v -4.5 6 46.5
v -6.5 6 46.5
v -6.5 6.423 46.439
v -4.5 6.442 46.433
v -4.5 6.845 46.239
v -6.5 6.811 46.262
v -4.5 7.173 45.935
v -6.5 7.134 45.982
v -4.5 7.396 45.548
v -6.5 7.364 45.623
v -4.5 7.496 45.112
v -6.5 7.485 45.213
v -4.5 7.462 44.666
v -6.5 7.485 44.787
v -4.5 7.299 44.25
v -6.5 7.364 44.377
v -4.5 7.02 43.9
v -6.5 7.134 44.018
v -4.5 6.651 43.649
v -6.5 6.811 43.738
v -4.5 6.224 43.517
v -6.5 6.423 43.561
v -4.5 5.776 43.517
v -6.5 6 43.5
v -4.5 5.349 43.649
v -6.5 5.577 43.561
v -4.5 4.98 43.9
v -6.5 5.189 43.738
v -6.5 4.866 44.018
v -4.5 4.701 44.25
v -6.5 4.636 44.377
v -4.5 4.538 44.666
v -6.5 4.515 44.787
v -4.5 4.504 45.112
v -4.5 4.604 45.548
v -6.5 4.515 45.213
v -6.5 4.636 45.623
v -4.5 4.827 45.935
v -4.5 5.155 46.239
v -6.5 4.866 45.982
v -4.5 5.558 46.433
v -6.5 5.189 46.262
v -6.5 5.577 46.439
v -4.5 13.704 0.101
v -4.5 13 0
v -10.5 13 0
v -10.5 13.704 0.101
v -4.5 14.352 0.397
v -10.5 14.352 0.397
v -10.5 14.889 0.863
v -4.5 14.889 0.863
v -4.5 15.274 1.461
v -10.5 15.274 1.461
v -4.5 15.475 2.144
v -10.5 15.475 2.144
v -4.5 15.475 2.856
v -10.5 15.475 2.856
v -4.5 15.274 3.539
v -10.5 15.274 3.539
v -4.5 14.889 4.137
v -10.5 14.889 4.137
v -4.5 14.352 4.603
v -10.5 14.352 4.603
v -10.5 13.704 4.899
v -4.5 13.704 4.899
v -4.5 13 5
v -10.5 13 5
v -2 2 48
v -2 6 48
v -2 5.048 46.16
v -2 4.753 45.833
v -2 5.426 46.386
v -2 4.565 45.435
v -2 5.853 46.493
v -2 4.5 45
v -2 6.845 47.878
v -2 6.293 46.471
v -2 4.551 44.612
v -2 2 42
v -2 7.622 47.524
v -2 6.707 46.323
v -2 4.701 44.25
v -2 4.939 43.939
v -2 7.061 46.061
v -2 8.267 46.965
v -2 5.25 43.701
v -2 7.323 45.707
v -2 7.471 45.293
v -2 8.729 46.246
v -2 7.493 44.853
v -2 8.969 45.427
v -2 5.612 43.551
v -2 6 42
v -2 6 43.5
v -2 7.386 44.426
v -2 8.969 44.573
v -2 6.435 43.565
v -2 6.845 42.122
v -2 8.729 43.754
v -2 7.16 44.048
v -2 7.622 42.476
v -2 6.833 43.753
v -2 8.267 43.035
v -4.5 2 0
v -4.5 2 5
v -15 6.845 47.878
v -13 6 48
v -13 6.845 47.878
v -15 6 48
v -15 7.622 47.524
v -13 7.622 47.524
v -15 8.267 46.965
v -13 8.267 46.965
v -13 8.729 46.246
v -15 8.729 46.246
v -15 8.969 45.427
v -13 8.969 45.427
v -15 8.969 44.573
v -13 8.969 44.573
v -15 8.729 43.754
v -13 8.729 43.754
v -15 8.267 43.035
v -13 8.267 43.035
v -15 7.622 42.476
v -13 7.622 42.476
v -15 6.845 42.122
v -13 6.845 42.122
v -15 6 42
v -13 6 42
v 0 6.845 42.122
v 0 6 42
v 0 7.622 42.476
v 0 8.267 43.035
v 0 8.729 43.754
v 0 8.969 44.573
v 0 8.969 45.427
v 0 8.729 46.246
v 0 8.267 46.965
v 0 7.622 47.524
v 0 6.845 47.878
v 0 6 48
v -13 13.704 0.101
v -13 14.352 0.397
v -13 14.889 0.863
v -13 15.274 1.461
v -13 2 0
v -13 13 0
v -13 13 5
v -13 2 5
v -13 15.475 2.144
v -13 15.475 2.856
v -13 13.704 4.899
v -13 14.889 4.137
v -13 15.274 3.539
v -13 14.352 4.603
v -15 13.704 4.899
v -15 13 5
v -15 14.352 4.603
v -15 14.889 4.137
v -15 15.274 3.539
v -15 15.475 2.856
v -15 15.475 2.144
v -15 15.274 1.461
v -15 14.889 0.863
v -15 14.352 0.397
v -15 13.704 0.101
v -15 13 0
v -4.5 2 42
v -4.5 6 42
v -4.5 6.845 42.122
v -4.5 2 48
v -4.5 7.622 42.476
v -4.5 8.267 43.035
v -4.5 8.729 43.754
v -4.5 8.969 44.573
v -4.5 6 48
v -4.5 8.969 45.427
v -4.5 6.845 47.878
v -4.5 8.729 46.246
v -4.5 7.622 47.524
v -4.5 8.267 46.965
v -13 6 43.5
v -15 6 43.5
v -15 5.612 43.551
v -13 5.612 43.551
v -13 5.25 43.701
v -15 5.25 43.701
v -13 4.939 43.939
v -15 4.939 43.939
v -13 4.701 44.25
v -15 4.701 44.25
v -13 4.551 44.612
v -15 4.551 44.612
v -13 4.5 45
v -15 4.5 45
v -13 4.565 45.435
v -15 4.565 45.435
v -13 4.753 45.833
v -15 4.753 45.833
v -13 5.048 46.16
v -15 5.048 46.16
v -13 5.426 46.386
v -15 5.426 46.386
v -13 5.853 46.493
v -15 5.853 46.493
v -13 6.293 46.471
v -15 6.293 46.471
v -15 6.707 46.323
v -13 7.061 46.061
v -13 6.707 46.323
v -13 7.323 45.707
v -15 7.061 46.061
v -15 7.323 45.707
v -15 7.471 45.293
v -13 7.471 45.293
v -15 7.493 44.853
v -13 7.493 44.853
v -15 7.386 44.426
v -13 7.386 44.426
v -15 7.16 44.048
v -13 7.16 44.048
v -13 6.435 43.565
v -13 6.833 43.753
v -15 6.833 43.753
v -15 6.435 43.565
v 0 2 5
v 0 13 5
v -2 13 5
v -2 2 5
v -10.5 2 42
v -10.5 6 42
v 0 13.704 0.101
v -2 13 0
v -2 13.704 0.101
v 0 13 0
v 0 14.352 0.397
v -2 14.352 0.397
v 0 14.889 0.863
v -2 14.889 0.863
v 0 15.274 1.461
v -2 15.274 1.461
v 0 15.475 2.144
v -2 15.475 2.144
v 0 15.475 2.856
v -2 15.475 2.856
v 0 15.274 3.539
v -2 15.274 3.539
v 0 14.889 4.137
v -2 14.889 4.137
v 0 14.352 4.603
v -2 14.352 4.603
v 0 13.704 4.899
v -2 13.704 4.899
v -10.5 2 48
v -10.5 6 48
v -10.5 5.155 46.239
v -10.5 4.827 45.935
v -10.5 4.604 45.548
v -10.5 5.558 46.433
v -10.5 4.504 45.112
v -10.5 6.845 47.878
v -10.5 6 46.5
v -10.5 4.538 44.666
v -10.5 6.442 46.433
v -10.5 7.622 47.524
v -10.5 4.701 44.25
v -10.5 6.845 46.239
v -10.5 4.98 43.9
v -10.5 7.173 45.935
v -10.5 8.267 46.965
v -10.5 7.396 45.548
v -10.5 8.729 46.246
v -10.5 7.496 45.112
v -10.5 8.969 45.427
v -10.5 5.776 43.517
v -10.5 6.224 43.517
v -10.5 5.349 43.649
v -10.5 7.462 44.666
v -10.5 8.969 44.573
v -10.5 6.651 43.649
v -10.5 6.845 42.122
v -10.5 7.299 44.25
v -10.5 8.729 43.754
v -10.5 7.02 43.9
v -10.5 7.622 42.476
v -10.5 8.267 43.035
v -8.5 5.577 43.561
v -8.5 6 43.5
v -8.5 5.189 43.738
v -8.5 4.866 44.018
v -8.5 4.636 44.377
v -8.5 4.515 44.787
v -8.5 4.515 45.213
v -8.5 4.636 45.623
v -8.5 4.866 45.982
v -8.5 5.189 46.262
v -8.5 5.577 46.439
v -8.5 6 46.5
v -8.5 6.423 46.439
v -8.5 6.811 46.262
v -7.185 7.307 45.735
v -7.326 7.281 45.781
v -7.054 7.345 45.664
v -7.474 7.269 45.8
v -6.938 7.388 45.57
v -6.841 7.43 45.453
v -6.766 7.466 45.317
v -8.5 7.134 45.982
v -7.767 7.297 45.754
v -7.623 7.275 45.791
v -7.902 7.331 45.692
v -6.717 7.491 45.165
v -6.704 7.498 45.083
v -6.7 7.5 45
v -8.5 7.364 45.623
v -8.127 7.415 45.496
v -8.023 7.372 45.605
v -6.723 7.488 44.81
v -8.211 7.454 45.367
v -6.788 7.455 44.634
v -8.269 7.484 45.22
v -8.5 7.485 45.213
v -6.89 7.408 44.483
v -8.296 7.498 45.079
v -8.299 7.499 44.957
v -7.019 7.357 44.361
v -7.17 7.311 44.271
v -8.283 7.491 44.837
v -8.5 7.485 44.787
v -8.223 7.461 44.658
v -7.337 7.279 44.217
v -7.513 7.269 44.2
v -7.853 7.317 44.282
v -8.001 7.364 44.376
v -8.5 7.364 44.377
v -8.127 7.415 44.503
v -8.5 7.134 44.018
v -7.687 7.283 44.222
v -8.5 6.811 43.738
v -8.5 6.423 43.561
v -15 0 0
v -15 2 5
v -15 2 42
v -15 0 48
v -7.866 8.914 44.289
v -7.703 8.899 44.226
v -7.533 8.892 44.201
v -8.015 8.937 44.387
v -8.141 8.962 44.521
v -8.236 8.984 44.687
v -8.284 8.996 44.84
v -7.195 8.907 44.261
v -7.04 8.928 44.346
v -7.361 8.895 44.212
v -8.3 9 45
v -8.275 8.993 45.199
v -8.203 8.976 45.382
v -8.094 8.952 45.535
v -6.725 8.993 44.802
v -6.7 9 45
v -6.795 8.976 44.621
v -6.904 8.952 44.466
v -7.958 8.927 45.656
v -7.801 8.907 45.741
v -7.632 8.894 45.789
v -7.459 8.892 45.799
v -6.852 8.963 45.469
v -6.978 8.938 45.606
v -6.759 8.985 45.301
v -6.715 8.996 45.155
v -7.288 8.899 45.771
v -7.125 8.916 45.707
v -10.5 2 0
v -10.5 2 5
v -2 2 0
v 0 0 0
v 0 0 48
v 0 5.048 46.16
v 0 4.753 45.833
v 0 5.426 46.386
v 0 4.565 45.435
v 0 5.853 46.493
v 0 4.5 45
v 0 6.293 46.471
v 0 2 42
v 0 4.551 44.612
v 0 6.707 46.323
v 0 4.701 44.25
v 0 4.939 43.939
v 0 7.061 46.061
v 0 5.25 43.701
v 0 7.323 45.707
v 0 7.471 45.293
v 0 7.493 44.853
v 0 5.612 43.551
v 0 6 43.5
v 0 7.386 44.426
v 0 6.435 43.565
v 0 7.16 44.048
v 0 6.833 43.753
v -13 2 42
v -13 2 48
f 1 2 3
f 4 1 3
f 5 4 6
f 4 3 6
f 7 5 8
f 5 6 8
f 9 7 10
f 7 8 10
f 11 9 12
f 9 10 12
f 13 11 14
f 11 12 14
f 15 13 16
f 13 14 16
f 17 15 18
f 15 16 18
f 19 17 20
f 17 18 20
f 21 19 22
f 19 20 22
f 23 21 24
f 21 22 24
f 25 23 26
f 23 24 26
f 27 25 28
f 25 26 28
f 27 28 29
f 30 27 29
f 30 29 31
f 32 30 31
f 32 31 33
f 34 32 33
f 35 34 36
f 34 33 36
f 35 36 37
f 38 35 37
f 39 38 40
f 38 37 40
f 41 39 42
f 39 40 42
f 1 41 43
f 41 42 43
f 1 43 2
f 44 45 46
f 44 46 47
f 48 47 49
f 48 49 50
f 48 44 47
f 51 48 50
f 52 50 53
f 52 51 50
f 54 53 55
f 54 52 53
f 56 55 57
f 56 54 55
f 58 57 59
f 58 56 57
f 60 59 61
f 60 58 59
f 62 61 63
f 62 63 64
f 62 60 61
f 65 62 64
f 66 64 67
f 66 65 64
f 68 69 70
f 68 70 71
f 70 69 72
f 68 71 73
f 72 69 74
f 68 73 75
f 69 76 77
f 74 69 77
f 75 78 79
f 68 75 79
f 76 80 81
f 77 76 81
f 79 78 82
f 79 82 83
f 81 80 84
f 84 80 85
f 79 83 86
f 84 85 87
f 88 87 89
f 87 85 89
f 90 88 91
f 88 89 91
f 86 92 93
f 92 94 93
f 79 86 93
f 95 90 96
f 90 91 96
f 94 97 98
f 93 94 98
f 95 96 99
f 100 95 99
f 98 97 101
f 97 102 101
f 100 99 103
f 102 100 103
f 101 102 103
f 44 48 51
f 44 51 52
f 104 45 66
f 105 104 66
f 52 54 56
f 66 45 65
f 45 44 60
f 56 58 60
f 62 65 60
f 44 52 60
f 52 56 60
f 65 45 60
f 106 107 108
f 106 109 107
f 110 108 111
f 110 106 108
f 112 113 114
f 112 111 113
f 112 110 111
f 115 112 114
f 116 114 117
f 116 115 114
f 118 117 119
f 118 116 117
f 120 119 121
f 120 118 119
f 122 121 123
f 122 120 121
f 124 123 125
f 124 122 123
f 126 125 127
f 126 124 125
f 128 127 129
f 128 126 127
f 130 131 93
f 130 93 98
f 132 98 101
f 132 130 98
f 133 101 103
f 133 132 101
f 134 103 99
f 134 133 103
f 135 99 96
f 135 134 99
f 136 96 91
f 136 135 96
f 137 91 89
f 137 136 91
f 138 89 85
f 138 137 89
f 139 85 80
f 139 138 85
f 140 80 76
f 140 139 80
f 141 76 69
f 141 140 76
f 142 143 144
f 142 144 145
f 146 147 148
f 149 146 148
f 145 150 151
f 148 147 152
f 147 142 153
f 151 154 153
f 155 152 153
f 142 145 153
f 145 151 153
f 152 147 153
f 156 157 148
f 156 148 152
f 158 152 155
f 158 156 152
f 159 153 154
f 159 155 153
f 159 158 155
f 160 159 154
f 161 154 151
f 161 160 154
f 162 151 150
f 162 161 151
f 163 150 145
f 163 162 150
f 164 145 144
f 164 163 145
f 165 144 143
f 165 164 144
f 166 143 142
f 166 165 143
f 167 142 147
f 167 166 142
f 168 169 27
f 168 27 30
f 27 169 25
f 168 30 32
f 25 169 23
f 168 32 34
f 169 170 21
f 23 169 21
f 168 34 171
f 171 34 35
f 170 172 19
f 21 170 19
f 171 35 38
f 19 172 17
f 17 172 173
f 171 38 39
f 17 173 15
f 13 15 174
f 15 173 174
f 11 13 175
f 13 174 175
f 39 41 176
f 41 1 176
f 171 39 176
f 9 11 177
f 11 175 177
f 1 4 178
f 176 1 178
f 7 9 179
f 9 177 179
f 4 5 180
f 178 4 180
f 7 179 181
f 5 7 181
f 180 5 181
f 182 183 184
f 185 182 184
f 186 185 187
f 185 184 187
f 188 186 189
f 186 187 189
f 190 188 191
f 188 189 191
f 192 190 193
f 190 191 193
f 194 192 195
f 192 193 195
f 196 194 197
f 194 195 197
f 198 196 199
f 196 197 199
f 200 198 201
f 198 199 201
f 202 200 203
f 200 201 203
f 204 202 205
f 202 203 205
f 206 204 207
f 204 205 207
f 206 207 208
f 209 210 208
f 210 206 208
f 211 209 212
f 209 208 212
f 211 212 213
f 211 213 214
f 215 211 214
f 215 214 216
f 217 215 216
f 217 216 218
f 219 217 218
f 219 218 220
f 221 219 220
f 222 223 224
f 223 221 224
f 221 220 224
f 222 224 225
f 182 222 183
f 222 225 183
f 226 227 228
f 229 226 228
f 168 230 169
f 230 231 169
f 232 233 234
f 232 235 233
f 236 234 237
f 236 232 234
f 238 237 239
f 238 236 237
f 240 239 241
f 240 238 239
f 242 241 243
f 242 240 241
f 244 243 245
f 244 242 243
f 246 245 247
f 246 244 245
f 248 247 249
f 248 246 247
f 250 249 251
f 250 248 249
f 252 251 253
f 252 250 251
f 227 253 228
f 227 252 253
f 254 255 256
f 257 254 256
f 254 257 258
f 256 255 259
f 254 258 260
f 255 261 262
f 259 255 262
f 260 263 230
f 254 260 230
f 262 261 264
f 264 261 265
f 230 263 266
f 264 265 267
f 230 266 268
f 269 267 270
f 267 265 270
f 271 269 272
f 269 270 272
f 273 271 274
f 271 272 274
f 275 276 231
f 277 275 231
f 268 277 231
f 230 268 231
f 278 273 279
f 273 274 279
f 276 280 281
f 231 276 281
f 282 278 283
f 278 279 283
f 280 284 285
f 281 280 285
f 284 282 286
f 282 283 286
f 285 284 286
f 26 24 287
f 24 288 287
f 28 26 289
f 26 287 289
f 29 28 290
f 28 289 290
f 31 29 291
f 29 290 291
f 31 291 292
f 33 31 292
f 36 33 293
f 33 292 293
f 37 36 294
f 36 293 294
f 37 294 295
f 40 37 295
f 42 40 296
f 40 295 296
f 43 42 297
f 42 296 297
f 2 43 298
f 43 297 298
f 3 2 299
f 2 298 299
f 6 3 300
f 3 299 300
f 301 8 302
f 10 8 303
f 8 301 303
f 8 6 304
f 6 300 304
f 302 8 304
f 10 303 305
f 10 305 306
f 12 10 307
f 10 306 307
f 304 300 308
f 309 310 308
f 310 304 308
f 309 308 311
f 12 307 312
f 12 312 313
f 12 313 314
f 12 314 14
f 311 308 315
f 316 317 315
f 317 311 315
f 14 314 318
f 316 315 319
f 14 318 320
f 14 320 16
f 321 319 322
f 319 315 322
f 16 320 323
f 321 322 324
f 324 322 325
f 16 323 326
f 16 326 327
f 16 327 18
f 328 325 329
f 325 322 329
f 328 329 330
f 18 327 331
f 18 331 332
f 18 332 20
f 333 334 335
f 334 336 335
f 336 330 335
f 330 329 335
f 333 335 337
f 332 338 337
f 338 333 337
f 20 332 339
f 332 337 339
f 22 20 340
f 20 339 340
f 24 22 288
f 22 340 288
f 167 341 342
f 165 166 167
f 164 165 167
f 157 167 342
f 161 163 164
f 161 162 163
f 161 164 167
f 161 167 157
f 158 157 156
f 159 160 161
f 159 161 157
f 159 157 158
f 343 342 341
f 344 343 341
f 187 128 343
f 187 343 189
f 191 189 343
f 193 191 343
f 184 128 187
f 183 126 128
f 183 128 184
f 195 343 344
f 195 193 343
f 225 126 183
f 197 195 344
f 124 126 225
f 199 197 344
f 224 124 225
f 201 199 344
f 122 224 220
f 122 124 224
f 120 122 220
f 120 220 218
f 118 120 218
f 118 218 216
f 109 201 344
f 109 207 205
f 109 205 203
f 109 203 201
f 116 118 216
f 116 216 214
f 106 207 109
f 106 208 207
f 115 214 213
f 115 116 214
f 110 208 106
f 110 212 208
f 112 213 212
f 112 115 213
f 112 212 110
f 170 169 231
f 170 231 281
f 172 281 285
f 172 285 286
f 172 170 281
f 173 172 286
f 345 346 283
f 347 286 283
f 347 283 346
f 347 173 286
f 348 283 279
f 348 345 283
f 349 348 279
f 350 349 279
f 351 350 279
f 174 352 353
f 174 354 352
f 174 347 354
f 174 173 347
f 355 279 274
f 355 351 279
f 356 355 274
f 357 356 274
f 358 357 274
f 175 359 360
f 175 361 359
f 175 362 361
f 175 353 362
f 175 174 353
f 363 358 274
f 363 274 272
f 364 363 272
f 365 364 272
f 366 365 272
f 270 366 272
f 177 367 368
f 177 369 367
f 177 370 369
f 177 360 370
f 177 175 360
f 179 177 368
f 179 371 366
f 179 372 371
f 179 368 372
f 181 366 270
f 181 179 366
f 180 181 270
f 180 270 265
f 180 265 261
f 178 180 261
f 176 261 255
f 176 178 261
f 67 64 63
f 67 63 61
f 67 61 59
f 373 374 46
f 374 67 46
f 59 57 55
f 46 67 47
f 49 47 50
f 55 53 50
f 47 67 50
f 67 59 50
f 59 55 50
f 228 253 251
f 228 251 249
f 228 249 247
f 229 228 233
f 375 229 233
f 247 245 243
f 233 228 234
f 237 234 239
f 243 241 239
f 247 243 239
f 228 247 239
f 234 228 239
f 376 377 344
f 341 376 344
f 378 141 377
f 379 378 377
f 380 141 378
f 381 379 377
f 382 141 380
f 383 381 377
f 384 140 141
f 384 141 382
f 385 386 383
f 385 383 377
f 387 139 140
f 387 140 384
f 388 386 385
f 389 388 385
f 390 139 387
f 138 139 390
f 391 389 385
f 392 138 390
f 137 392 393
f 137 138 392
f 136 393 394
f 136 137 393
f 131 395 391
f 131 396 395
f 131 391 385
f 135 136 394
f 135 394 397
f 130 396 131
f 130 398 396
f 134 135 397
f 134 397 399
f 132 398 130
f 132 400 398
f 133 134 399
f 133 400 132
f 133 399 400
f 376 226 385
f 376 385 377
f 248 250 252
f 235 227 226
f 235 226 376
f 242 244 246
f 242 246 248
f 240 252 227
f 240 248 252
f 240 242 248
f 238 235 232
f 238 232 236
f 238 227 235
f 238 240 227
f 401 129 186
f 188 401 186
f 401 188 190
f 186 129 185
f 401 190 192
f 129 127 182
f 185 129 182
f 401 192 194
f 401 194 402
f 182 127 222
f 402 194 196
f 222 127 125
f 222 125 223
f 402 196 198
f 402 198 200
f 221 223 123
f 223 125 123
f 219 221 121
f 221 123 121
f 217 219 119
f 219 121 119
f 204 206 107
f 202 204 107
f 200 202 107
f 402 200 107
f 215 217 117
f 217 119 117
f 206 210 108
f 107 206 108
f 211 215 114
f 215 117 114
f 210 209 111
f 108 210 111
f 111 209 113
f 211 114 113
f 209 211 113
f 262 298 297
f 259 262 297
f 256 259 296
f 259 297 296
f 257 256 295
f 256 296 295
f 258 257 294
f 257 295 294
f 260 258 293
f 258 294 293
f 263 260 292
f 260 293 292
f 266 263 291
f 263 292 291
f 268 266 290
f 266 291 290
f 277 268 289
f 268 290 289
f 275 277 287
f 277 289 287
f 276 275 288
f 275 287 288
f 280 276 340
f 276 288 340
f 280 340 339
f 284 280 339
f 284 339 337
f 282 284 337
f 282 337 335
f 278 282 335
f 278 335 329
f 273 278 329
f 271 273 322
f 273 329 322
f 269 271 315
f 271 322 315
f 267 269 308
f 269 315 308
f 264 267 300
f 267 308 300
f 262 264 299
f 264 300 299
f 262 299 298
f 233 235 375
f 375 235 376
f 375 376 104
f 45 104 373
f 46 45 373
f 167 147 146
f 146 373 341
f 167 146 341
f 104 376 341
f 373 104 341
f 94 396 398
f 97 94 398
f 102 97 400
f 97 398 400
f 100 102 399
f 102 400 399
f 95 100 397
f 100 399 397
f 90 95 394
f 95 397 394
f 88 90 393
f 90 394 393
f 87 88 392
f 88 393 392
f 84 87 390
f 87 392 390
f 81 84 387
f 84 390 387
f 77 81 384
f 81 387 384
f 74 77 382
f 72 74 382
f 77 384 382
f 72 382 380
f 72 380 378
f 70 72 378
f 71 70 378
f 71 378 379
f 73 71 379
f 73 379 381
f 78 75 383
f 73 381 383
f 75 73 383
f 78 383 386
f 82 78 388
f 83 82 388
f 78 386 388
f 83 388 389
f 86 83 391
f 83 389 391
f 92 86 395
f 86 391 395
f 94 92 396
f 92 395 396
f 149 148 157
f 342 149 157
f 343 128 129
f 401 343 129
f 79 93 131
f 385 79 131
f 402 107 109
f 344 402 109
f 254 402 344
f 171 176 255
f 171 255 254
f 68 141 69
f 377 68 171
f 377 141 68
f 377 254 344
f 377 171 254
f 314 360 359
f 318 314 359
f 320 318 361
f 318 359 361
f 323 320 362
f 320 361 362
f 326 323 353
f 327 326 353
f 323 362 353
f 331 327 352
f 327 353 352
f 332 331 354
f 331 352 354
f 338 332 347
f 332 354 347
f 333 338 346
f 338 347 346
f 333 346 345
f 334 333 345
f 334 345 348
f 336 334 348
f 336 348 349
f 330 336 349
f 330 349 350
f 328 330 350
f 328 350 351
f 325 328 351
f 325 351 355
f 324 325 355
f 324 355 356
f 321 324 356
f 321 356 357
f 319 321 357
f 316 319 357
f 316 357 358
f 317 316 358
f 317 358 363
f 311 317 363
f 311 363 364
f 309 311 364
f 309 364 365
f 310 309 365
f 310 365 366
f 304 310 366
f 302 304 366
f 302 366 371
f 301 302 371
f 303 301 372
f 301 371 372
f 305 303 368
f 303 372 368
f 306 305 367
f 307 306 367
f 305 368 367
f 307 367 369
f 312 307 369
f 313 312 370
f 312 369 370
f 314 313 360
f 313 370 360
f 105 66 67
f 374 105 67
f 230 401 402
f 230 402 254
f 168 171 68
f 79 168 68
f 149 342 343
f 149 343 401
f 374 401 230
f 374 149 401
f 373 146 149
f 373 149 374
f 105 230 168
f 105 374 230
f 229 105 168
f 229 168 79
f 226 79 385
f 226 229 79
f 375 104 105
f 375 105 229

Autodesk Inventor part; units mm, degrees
sketch "Sketch1" plane through (0, 0, 0) normal (0, 1, 0) x (-1, 0, 0)
  line L0 (0, 0) -> (15, 0)
  line L1 (15, 0) -> (15, 120)
  line L2 (15, 120) -> (0, 120)
  line L3 (0, 120) -> (0, 0)
  dimension "d0" = 15
  dimension "d1" = 120
extrude "Extrusion1" add sketch "Sketch1" along normal blind 3
sketch "Sketch3" plane through (0, 0, 120) normal (1, 0, 0) x (0, 0, -1)
  line L0 (120, 0) -> (115, 0)
  line L1 (0, 0) -> (120, 0) projected
  line L2 (115, 0) -> (115, 3)
  line L3 (0, 3) -> (120, 3) projected
  line L4 (115, 3) -> (115, 13)
  line L5 (120, 13) -> (120, 3)
  line L6 (120, 3) -> (115, 3)
  arc A0 (120, 13) -> (115, 13) centre (117.5, 13) ccw
  dimension "d4" = 5
  dimension "d5" = 10
extrude "Extrusion2" add sketch "Sketch3" against normal blind 2
ref_plane "Work Plane1" through (-7.5, 0, 0) normal (1, 0, 0) x (0, 1, 0)
mirror "Mirror1" about plane through (-7.5, 0, 0) normal (1, 0, 0) of "Extrusion2"
ref_plane "Work Plane2" through (-4.25, 0, 0) normal (1, 0, 0) x (0, 1, 0)
mirror "Mirror2" about plane through (-4.25, 0, 0) normal (1, 0, 0) of "Extrusion2"
sketch "Sketch6" plane through (-6.5, 3, 0) normal (1, 0, 0) x (0, 0, -1)
  line L0 (0, 0) -> (-5, 0)
  line L1 (-5, 0) -> (-5, 10)
  line L2 (-5, 0) -> (-5, 10) projected
  line L3 (-5, 10) -> (-5, 0)
  arc A0 (0, 10) -> (-5, 10) centre (-2.5, 10) ccw projected
  arc A1 (0, 10) -> (-5, 10) centre (-2.5, 10) ccw
  line L4 (0, 10) -> (0, 0) projected
  line L5 (0, 10) -> (0, 0)
  point P0 (0, -3)
extrude "Extrusion3" add sketch "Sketch6" along normal blind 2
mirror "Mirror3" about plane through (-7.5, 0, 0) normal (1, 0, 0) of "Extrusion3"
sketch "Sketch9" plane through (0, 0, 120) normal (1, 0, 0) x (0, 0, -1)
  line L0 (120, 0) -> (75, 0)
  line L1 (120, 0) -> (0, 0) projected
  line L2 (75, 0) -> (75, 3)
  line L3 (0, 3) -> (115, 3) projected
  line L4 (75, 3) -> (72, 3)
  line L5 (75, 3) -> (78, 3)
  line L6 (75, 3) -> (75, 6)
  circle A0 centre (75, 6) radius 1.5
  line L7 (72, 3) -> (72, 6)
  line L8 (78, 3) -> (78, 6)
  arc A1 (78, 6) -> (72, 6) centre (75, 6) ccw
  dimension "d16" = 45
  dimension "d17" = 3
  dimension "d18" = 3
  dimension "d20" = 3
extrude "Extrusion4" add sketch "Sketch9" against normal blind 2
mirror "Mirror4" about plane through (-7.5, 0, 0) normal (1, 0, 0) of "Extrusion4"
mirror "Mirror5" about plane through (-4.25, 0, 0) normal (1, 0, 0) of "Extrusion4"
sketch "Sketch10" plane through (-6.5, 3, 42) normal (1, 0, 0) x (0, 0, -1)
  line L0 (-6, 0) -> (0, 0)
  line L1 (0, 0) -> (-6, 0) projected
  line L2 (0, 0) -> (0, 3)
  arc A0 (0, 3) -> (-6, 3) centre (-3, 3) ccw projected
  arc A1 (0, 3) -> (-6, 3) centre (-3, 3) ccw
  line L3 (-6, 0) -> (-6, 3)
  line L4 (-6, 0) -> (-6, 3) projected
  point P0 (42, -3)
extrude "Extrusion5" add sketch "Sketch10" along normal blind 2
sketch "Sketch11" plane through (-6.5, 6, 45) normal (-1, 0, 0) x (0, 0, 1)
  circle A0 centre (0, 0) radius 1.5
  point P0 (-45, -6)
extrude "Extrusion6" cut sketch "Sketch11" against normal blind 2
mirror "Mirror6" about plane through (-7.5, 0, 0) normal (1, 0, 0) of "Extrusion5", "Extrusion6"
sketch "Sketch12" plane through (0, 3, 0) normal (0, 1, 0) x (1, 0, 0)
  line L0 (0, -120) -> (-15, -120)
  line L1 (-15, -120) -> (-15, -48)
  line L2 (-15, -48) -> (0, -48)
  line L3 (0, -48) -> (0, -120)
  point P0 (0, 0)
extrude "Extrusion7" cut sketch "Sketch12" against normal blind 3
sketch "Sketch13" plane through (0, 3, 0) normal (0, 1, 0) x (1, 0, 0)
  line L0 (-15, -5) -> (-15, -42)
  line L1 (-15, -42) -> (-13, -42)
  line L2 (-15, -42) -> (-13, -42) projected
  line L3 (-13, -42) -> (-13, -48)
  line L4 (-13, -42) -> (-13, -48) projected
  line L5 (-13, -48) -> (-10.5, -48)
  line L6 (-10.5, -48) -> (-10.5, -42)
  line L7 (-10.5, -48) -> (-10.5, -42) projected
  line L8 (-10.5, -42) -> (-4.5, -42)
  line L9 (-10.5, -42) -> (-4.5, -42) projected
  line L10 (-4.5, -42) -> (-4.5, -48)
  line L11 (-4.5, -48) -> (-2, -48)
  line L12 (-4.5, -48) -> (-2, -48) projected
  line L13 (-2, -48) -> (-2, -42)
  line L14 (-2, -48) -> (-2, -42) projected
  line L15 (-2, -42) -> (0, -42)
  line L16 (0, -42) -> (0, -5)
  line L17 (0, -5) -> (-2, -5)
  line L18 (-2, -5) -> (-2, 0)
  line L19 (-2, 0) -> (-4.5, 0)
  line L20 (-4.5, 0) -> (-4.5, -5)
  line L21 (-4.5, -5) -> (-10.5, -5)
  line L22 (-4.5, -5) -> (-10.5, -5) projected
  line L23 (-10.5, -5) -> (-10.5, 0)
  line L24 (-10.5, 0) -> (-13, 0)
  line L25 (-10.5, 0) -> (-13, 0) projected
  line L26 (-13, 0) -> (-13, -5)
  line L27 (-13, -5) -> (-15, -5)
  line L28 (-13, -5) -> (-15, -5) projected
  line L29 (-15, -5) -> (-15, -42)
  line L30 (-15, 0) -> (-15, -48) projected
  point P0 (0, 0)
extrude "Extrusion8" cut sketch "Sketch13" against normal blind 1
ref_plane "Work Plane3" through (0, 9, 0) normal (0, 1, 0) x (1, 0, 0)
sketch "Sketch15" plane through (0, 9, 0) normal (0, 1, 0) x (1, 0, 0)
  line L0 (-4.5, -48) -> (-4.5, -42) projected
  line L1 (-4.5, -45) -> (-10.5, -45)
  line L2 (-10.5, -48) -> (-10.5, -42) projected
  circle A0 centre (-7.5, -45) radius 0.8
  point P0 (0, 0)
  dimension "d32" = 1.6
extrude "Extrusion9" cut sketch "Sketch15" against normal blind 3
properties part number "armholder"
